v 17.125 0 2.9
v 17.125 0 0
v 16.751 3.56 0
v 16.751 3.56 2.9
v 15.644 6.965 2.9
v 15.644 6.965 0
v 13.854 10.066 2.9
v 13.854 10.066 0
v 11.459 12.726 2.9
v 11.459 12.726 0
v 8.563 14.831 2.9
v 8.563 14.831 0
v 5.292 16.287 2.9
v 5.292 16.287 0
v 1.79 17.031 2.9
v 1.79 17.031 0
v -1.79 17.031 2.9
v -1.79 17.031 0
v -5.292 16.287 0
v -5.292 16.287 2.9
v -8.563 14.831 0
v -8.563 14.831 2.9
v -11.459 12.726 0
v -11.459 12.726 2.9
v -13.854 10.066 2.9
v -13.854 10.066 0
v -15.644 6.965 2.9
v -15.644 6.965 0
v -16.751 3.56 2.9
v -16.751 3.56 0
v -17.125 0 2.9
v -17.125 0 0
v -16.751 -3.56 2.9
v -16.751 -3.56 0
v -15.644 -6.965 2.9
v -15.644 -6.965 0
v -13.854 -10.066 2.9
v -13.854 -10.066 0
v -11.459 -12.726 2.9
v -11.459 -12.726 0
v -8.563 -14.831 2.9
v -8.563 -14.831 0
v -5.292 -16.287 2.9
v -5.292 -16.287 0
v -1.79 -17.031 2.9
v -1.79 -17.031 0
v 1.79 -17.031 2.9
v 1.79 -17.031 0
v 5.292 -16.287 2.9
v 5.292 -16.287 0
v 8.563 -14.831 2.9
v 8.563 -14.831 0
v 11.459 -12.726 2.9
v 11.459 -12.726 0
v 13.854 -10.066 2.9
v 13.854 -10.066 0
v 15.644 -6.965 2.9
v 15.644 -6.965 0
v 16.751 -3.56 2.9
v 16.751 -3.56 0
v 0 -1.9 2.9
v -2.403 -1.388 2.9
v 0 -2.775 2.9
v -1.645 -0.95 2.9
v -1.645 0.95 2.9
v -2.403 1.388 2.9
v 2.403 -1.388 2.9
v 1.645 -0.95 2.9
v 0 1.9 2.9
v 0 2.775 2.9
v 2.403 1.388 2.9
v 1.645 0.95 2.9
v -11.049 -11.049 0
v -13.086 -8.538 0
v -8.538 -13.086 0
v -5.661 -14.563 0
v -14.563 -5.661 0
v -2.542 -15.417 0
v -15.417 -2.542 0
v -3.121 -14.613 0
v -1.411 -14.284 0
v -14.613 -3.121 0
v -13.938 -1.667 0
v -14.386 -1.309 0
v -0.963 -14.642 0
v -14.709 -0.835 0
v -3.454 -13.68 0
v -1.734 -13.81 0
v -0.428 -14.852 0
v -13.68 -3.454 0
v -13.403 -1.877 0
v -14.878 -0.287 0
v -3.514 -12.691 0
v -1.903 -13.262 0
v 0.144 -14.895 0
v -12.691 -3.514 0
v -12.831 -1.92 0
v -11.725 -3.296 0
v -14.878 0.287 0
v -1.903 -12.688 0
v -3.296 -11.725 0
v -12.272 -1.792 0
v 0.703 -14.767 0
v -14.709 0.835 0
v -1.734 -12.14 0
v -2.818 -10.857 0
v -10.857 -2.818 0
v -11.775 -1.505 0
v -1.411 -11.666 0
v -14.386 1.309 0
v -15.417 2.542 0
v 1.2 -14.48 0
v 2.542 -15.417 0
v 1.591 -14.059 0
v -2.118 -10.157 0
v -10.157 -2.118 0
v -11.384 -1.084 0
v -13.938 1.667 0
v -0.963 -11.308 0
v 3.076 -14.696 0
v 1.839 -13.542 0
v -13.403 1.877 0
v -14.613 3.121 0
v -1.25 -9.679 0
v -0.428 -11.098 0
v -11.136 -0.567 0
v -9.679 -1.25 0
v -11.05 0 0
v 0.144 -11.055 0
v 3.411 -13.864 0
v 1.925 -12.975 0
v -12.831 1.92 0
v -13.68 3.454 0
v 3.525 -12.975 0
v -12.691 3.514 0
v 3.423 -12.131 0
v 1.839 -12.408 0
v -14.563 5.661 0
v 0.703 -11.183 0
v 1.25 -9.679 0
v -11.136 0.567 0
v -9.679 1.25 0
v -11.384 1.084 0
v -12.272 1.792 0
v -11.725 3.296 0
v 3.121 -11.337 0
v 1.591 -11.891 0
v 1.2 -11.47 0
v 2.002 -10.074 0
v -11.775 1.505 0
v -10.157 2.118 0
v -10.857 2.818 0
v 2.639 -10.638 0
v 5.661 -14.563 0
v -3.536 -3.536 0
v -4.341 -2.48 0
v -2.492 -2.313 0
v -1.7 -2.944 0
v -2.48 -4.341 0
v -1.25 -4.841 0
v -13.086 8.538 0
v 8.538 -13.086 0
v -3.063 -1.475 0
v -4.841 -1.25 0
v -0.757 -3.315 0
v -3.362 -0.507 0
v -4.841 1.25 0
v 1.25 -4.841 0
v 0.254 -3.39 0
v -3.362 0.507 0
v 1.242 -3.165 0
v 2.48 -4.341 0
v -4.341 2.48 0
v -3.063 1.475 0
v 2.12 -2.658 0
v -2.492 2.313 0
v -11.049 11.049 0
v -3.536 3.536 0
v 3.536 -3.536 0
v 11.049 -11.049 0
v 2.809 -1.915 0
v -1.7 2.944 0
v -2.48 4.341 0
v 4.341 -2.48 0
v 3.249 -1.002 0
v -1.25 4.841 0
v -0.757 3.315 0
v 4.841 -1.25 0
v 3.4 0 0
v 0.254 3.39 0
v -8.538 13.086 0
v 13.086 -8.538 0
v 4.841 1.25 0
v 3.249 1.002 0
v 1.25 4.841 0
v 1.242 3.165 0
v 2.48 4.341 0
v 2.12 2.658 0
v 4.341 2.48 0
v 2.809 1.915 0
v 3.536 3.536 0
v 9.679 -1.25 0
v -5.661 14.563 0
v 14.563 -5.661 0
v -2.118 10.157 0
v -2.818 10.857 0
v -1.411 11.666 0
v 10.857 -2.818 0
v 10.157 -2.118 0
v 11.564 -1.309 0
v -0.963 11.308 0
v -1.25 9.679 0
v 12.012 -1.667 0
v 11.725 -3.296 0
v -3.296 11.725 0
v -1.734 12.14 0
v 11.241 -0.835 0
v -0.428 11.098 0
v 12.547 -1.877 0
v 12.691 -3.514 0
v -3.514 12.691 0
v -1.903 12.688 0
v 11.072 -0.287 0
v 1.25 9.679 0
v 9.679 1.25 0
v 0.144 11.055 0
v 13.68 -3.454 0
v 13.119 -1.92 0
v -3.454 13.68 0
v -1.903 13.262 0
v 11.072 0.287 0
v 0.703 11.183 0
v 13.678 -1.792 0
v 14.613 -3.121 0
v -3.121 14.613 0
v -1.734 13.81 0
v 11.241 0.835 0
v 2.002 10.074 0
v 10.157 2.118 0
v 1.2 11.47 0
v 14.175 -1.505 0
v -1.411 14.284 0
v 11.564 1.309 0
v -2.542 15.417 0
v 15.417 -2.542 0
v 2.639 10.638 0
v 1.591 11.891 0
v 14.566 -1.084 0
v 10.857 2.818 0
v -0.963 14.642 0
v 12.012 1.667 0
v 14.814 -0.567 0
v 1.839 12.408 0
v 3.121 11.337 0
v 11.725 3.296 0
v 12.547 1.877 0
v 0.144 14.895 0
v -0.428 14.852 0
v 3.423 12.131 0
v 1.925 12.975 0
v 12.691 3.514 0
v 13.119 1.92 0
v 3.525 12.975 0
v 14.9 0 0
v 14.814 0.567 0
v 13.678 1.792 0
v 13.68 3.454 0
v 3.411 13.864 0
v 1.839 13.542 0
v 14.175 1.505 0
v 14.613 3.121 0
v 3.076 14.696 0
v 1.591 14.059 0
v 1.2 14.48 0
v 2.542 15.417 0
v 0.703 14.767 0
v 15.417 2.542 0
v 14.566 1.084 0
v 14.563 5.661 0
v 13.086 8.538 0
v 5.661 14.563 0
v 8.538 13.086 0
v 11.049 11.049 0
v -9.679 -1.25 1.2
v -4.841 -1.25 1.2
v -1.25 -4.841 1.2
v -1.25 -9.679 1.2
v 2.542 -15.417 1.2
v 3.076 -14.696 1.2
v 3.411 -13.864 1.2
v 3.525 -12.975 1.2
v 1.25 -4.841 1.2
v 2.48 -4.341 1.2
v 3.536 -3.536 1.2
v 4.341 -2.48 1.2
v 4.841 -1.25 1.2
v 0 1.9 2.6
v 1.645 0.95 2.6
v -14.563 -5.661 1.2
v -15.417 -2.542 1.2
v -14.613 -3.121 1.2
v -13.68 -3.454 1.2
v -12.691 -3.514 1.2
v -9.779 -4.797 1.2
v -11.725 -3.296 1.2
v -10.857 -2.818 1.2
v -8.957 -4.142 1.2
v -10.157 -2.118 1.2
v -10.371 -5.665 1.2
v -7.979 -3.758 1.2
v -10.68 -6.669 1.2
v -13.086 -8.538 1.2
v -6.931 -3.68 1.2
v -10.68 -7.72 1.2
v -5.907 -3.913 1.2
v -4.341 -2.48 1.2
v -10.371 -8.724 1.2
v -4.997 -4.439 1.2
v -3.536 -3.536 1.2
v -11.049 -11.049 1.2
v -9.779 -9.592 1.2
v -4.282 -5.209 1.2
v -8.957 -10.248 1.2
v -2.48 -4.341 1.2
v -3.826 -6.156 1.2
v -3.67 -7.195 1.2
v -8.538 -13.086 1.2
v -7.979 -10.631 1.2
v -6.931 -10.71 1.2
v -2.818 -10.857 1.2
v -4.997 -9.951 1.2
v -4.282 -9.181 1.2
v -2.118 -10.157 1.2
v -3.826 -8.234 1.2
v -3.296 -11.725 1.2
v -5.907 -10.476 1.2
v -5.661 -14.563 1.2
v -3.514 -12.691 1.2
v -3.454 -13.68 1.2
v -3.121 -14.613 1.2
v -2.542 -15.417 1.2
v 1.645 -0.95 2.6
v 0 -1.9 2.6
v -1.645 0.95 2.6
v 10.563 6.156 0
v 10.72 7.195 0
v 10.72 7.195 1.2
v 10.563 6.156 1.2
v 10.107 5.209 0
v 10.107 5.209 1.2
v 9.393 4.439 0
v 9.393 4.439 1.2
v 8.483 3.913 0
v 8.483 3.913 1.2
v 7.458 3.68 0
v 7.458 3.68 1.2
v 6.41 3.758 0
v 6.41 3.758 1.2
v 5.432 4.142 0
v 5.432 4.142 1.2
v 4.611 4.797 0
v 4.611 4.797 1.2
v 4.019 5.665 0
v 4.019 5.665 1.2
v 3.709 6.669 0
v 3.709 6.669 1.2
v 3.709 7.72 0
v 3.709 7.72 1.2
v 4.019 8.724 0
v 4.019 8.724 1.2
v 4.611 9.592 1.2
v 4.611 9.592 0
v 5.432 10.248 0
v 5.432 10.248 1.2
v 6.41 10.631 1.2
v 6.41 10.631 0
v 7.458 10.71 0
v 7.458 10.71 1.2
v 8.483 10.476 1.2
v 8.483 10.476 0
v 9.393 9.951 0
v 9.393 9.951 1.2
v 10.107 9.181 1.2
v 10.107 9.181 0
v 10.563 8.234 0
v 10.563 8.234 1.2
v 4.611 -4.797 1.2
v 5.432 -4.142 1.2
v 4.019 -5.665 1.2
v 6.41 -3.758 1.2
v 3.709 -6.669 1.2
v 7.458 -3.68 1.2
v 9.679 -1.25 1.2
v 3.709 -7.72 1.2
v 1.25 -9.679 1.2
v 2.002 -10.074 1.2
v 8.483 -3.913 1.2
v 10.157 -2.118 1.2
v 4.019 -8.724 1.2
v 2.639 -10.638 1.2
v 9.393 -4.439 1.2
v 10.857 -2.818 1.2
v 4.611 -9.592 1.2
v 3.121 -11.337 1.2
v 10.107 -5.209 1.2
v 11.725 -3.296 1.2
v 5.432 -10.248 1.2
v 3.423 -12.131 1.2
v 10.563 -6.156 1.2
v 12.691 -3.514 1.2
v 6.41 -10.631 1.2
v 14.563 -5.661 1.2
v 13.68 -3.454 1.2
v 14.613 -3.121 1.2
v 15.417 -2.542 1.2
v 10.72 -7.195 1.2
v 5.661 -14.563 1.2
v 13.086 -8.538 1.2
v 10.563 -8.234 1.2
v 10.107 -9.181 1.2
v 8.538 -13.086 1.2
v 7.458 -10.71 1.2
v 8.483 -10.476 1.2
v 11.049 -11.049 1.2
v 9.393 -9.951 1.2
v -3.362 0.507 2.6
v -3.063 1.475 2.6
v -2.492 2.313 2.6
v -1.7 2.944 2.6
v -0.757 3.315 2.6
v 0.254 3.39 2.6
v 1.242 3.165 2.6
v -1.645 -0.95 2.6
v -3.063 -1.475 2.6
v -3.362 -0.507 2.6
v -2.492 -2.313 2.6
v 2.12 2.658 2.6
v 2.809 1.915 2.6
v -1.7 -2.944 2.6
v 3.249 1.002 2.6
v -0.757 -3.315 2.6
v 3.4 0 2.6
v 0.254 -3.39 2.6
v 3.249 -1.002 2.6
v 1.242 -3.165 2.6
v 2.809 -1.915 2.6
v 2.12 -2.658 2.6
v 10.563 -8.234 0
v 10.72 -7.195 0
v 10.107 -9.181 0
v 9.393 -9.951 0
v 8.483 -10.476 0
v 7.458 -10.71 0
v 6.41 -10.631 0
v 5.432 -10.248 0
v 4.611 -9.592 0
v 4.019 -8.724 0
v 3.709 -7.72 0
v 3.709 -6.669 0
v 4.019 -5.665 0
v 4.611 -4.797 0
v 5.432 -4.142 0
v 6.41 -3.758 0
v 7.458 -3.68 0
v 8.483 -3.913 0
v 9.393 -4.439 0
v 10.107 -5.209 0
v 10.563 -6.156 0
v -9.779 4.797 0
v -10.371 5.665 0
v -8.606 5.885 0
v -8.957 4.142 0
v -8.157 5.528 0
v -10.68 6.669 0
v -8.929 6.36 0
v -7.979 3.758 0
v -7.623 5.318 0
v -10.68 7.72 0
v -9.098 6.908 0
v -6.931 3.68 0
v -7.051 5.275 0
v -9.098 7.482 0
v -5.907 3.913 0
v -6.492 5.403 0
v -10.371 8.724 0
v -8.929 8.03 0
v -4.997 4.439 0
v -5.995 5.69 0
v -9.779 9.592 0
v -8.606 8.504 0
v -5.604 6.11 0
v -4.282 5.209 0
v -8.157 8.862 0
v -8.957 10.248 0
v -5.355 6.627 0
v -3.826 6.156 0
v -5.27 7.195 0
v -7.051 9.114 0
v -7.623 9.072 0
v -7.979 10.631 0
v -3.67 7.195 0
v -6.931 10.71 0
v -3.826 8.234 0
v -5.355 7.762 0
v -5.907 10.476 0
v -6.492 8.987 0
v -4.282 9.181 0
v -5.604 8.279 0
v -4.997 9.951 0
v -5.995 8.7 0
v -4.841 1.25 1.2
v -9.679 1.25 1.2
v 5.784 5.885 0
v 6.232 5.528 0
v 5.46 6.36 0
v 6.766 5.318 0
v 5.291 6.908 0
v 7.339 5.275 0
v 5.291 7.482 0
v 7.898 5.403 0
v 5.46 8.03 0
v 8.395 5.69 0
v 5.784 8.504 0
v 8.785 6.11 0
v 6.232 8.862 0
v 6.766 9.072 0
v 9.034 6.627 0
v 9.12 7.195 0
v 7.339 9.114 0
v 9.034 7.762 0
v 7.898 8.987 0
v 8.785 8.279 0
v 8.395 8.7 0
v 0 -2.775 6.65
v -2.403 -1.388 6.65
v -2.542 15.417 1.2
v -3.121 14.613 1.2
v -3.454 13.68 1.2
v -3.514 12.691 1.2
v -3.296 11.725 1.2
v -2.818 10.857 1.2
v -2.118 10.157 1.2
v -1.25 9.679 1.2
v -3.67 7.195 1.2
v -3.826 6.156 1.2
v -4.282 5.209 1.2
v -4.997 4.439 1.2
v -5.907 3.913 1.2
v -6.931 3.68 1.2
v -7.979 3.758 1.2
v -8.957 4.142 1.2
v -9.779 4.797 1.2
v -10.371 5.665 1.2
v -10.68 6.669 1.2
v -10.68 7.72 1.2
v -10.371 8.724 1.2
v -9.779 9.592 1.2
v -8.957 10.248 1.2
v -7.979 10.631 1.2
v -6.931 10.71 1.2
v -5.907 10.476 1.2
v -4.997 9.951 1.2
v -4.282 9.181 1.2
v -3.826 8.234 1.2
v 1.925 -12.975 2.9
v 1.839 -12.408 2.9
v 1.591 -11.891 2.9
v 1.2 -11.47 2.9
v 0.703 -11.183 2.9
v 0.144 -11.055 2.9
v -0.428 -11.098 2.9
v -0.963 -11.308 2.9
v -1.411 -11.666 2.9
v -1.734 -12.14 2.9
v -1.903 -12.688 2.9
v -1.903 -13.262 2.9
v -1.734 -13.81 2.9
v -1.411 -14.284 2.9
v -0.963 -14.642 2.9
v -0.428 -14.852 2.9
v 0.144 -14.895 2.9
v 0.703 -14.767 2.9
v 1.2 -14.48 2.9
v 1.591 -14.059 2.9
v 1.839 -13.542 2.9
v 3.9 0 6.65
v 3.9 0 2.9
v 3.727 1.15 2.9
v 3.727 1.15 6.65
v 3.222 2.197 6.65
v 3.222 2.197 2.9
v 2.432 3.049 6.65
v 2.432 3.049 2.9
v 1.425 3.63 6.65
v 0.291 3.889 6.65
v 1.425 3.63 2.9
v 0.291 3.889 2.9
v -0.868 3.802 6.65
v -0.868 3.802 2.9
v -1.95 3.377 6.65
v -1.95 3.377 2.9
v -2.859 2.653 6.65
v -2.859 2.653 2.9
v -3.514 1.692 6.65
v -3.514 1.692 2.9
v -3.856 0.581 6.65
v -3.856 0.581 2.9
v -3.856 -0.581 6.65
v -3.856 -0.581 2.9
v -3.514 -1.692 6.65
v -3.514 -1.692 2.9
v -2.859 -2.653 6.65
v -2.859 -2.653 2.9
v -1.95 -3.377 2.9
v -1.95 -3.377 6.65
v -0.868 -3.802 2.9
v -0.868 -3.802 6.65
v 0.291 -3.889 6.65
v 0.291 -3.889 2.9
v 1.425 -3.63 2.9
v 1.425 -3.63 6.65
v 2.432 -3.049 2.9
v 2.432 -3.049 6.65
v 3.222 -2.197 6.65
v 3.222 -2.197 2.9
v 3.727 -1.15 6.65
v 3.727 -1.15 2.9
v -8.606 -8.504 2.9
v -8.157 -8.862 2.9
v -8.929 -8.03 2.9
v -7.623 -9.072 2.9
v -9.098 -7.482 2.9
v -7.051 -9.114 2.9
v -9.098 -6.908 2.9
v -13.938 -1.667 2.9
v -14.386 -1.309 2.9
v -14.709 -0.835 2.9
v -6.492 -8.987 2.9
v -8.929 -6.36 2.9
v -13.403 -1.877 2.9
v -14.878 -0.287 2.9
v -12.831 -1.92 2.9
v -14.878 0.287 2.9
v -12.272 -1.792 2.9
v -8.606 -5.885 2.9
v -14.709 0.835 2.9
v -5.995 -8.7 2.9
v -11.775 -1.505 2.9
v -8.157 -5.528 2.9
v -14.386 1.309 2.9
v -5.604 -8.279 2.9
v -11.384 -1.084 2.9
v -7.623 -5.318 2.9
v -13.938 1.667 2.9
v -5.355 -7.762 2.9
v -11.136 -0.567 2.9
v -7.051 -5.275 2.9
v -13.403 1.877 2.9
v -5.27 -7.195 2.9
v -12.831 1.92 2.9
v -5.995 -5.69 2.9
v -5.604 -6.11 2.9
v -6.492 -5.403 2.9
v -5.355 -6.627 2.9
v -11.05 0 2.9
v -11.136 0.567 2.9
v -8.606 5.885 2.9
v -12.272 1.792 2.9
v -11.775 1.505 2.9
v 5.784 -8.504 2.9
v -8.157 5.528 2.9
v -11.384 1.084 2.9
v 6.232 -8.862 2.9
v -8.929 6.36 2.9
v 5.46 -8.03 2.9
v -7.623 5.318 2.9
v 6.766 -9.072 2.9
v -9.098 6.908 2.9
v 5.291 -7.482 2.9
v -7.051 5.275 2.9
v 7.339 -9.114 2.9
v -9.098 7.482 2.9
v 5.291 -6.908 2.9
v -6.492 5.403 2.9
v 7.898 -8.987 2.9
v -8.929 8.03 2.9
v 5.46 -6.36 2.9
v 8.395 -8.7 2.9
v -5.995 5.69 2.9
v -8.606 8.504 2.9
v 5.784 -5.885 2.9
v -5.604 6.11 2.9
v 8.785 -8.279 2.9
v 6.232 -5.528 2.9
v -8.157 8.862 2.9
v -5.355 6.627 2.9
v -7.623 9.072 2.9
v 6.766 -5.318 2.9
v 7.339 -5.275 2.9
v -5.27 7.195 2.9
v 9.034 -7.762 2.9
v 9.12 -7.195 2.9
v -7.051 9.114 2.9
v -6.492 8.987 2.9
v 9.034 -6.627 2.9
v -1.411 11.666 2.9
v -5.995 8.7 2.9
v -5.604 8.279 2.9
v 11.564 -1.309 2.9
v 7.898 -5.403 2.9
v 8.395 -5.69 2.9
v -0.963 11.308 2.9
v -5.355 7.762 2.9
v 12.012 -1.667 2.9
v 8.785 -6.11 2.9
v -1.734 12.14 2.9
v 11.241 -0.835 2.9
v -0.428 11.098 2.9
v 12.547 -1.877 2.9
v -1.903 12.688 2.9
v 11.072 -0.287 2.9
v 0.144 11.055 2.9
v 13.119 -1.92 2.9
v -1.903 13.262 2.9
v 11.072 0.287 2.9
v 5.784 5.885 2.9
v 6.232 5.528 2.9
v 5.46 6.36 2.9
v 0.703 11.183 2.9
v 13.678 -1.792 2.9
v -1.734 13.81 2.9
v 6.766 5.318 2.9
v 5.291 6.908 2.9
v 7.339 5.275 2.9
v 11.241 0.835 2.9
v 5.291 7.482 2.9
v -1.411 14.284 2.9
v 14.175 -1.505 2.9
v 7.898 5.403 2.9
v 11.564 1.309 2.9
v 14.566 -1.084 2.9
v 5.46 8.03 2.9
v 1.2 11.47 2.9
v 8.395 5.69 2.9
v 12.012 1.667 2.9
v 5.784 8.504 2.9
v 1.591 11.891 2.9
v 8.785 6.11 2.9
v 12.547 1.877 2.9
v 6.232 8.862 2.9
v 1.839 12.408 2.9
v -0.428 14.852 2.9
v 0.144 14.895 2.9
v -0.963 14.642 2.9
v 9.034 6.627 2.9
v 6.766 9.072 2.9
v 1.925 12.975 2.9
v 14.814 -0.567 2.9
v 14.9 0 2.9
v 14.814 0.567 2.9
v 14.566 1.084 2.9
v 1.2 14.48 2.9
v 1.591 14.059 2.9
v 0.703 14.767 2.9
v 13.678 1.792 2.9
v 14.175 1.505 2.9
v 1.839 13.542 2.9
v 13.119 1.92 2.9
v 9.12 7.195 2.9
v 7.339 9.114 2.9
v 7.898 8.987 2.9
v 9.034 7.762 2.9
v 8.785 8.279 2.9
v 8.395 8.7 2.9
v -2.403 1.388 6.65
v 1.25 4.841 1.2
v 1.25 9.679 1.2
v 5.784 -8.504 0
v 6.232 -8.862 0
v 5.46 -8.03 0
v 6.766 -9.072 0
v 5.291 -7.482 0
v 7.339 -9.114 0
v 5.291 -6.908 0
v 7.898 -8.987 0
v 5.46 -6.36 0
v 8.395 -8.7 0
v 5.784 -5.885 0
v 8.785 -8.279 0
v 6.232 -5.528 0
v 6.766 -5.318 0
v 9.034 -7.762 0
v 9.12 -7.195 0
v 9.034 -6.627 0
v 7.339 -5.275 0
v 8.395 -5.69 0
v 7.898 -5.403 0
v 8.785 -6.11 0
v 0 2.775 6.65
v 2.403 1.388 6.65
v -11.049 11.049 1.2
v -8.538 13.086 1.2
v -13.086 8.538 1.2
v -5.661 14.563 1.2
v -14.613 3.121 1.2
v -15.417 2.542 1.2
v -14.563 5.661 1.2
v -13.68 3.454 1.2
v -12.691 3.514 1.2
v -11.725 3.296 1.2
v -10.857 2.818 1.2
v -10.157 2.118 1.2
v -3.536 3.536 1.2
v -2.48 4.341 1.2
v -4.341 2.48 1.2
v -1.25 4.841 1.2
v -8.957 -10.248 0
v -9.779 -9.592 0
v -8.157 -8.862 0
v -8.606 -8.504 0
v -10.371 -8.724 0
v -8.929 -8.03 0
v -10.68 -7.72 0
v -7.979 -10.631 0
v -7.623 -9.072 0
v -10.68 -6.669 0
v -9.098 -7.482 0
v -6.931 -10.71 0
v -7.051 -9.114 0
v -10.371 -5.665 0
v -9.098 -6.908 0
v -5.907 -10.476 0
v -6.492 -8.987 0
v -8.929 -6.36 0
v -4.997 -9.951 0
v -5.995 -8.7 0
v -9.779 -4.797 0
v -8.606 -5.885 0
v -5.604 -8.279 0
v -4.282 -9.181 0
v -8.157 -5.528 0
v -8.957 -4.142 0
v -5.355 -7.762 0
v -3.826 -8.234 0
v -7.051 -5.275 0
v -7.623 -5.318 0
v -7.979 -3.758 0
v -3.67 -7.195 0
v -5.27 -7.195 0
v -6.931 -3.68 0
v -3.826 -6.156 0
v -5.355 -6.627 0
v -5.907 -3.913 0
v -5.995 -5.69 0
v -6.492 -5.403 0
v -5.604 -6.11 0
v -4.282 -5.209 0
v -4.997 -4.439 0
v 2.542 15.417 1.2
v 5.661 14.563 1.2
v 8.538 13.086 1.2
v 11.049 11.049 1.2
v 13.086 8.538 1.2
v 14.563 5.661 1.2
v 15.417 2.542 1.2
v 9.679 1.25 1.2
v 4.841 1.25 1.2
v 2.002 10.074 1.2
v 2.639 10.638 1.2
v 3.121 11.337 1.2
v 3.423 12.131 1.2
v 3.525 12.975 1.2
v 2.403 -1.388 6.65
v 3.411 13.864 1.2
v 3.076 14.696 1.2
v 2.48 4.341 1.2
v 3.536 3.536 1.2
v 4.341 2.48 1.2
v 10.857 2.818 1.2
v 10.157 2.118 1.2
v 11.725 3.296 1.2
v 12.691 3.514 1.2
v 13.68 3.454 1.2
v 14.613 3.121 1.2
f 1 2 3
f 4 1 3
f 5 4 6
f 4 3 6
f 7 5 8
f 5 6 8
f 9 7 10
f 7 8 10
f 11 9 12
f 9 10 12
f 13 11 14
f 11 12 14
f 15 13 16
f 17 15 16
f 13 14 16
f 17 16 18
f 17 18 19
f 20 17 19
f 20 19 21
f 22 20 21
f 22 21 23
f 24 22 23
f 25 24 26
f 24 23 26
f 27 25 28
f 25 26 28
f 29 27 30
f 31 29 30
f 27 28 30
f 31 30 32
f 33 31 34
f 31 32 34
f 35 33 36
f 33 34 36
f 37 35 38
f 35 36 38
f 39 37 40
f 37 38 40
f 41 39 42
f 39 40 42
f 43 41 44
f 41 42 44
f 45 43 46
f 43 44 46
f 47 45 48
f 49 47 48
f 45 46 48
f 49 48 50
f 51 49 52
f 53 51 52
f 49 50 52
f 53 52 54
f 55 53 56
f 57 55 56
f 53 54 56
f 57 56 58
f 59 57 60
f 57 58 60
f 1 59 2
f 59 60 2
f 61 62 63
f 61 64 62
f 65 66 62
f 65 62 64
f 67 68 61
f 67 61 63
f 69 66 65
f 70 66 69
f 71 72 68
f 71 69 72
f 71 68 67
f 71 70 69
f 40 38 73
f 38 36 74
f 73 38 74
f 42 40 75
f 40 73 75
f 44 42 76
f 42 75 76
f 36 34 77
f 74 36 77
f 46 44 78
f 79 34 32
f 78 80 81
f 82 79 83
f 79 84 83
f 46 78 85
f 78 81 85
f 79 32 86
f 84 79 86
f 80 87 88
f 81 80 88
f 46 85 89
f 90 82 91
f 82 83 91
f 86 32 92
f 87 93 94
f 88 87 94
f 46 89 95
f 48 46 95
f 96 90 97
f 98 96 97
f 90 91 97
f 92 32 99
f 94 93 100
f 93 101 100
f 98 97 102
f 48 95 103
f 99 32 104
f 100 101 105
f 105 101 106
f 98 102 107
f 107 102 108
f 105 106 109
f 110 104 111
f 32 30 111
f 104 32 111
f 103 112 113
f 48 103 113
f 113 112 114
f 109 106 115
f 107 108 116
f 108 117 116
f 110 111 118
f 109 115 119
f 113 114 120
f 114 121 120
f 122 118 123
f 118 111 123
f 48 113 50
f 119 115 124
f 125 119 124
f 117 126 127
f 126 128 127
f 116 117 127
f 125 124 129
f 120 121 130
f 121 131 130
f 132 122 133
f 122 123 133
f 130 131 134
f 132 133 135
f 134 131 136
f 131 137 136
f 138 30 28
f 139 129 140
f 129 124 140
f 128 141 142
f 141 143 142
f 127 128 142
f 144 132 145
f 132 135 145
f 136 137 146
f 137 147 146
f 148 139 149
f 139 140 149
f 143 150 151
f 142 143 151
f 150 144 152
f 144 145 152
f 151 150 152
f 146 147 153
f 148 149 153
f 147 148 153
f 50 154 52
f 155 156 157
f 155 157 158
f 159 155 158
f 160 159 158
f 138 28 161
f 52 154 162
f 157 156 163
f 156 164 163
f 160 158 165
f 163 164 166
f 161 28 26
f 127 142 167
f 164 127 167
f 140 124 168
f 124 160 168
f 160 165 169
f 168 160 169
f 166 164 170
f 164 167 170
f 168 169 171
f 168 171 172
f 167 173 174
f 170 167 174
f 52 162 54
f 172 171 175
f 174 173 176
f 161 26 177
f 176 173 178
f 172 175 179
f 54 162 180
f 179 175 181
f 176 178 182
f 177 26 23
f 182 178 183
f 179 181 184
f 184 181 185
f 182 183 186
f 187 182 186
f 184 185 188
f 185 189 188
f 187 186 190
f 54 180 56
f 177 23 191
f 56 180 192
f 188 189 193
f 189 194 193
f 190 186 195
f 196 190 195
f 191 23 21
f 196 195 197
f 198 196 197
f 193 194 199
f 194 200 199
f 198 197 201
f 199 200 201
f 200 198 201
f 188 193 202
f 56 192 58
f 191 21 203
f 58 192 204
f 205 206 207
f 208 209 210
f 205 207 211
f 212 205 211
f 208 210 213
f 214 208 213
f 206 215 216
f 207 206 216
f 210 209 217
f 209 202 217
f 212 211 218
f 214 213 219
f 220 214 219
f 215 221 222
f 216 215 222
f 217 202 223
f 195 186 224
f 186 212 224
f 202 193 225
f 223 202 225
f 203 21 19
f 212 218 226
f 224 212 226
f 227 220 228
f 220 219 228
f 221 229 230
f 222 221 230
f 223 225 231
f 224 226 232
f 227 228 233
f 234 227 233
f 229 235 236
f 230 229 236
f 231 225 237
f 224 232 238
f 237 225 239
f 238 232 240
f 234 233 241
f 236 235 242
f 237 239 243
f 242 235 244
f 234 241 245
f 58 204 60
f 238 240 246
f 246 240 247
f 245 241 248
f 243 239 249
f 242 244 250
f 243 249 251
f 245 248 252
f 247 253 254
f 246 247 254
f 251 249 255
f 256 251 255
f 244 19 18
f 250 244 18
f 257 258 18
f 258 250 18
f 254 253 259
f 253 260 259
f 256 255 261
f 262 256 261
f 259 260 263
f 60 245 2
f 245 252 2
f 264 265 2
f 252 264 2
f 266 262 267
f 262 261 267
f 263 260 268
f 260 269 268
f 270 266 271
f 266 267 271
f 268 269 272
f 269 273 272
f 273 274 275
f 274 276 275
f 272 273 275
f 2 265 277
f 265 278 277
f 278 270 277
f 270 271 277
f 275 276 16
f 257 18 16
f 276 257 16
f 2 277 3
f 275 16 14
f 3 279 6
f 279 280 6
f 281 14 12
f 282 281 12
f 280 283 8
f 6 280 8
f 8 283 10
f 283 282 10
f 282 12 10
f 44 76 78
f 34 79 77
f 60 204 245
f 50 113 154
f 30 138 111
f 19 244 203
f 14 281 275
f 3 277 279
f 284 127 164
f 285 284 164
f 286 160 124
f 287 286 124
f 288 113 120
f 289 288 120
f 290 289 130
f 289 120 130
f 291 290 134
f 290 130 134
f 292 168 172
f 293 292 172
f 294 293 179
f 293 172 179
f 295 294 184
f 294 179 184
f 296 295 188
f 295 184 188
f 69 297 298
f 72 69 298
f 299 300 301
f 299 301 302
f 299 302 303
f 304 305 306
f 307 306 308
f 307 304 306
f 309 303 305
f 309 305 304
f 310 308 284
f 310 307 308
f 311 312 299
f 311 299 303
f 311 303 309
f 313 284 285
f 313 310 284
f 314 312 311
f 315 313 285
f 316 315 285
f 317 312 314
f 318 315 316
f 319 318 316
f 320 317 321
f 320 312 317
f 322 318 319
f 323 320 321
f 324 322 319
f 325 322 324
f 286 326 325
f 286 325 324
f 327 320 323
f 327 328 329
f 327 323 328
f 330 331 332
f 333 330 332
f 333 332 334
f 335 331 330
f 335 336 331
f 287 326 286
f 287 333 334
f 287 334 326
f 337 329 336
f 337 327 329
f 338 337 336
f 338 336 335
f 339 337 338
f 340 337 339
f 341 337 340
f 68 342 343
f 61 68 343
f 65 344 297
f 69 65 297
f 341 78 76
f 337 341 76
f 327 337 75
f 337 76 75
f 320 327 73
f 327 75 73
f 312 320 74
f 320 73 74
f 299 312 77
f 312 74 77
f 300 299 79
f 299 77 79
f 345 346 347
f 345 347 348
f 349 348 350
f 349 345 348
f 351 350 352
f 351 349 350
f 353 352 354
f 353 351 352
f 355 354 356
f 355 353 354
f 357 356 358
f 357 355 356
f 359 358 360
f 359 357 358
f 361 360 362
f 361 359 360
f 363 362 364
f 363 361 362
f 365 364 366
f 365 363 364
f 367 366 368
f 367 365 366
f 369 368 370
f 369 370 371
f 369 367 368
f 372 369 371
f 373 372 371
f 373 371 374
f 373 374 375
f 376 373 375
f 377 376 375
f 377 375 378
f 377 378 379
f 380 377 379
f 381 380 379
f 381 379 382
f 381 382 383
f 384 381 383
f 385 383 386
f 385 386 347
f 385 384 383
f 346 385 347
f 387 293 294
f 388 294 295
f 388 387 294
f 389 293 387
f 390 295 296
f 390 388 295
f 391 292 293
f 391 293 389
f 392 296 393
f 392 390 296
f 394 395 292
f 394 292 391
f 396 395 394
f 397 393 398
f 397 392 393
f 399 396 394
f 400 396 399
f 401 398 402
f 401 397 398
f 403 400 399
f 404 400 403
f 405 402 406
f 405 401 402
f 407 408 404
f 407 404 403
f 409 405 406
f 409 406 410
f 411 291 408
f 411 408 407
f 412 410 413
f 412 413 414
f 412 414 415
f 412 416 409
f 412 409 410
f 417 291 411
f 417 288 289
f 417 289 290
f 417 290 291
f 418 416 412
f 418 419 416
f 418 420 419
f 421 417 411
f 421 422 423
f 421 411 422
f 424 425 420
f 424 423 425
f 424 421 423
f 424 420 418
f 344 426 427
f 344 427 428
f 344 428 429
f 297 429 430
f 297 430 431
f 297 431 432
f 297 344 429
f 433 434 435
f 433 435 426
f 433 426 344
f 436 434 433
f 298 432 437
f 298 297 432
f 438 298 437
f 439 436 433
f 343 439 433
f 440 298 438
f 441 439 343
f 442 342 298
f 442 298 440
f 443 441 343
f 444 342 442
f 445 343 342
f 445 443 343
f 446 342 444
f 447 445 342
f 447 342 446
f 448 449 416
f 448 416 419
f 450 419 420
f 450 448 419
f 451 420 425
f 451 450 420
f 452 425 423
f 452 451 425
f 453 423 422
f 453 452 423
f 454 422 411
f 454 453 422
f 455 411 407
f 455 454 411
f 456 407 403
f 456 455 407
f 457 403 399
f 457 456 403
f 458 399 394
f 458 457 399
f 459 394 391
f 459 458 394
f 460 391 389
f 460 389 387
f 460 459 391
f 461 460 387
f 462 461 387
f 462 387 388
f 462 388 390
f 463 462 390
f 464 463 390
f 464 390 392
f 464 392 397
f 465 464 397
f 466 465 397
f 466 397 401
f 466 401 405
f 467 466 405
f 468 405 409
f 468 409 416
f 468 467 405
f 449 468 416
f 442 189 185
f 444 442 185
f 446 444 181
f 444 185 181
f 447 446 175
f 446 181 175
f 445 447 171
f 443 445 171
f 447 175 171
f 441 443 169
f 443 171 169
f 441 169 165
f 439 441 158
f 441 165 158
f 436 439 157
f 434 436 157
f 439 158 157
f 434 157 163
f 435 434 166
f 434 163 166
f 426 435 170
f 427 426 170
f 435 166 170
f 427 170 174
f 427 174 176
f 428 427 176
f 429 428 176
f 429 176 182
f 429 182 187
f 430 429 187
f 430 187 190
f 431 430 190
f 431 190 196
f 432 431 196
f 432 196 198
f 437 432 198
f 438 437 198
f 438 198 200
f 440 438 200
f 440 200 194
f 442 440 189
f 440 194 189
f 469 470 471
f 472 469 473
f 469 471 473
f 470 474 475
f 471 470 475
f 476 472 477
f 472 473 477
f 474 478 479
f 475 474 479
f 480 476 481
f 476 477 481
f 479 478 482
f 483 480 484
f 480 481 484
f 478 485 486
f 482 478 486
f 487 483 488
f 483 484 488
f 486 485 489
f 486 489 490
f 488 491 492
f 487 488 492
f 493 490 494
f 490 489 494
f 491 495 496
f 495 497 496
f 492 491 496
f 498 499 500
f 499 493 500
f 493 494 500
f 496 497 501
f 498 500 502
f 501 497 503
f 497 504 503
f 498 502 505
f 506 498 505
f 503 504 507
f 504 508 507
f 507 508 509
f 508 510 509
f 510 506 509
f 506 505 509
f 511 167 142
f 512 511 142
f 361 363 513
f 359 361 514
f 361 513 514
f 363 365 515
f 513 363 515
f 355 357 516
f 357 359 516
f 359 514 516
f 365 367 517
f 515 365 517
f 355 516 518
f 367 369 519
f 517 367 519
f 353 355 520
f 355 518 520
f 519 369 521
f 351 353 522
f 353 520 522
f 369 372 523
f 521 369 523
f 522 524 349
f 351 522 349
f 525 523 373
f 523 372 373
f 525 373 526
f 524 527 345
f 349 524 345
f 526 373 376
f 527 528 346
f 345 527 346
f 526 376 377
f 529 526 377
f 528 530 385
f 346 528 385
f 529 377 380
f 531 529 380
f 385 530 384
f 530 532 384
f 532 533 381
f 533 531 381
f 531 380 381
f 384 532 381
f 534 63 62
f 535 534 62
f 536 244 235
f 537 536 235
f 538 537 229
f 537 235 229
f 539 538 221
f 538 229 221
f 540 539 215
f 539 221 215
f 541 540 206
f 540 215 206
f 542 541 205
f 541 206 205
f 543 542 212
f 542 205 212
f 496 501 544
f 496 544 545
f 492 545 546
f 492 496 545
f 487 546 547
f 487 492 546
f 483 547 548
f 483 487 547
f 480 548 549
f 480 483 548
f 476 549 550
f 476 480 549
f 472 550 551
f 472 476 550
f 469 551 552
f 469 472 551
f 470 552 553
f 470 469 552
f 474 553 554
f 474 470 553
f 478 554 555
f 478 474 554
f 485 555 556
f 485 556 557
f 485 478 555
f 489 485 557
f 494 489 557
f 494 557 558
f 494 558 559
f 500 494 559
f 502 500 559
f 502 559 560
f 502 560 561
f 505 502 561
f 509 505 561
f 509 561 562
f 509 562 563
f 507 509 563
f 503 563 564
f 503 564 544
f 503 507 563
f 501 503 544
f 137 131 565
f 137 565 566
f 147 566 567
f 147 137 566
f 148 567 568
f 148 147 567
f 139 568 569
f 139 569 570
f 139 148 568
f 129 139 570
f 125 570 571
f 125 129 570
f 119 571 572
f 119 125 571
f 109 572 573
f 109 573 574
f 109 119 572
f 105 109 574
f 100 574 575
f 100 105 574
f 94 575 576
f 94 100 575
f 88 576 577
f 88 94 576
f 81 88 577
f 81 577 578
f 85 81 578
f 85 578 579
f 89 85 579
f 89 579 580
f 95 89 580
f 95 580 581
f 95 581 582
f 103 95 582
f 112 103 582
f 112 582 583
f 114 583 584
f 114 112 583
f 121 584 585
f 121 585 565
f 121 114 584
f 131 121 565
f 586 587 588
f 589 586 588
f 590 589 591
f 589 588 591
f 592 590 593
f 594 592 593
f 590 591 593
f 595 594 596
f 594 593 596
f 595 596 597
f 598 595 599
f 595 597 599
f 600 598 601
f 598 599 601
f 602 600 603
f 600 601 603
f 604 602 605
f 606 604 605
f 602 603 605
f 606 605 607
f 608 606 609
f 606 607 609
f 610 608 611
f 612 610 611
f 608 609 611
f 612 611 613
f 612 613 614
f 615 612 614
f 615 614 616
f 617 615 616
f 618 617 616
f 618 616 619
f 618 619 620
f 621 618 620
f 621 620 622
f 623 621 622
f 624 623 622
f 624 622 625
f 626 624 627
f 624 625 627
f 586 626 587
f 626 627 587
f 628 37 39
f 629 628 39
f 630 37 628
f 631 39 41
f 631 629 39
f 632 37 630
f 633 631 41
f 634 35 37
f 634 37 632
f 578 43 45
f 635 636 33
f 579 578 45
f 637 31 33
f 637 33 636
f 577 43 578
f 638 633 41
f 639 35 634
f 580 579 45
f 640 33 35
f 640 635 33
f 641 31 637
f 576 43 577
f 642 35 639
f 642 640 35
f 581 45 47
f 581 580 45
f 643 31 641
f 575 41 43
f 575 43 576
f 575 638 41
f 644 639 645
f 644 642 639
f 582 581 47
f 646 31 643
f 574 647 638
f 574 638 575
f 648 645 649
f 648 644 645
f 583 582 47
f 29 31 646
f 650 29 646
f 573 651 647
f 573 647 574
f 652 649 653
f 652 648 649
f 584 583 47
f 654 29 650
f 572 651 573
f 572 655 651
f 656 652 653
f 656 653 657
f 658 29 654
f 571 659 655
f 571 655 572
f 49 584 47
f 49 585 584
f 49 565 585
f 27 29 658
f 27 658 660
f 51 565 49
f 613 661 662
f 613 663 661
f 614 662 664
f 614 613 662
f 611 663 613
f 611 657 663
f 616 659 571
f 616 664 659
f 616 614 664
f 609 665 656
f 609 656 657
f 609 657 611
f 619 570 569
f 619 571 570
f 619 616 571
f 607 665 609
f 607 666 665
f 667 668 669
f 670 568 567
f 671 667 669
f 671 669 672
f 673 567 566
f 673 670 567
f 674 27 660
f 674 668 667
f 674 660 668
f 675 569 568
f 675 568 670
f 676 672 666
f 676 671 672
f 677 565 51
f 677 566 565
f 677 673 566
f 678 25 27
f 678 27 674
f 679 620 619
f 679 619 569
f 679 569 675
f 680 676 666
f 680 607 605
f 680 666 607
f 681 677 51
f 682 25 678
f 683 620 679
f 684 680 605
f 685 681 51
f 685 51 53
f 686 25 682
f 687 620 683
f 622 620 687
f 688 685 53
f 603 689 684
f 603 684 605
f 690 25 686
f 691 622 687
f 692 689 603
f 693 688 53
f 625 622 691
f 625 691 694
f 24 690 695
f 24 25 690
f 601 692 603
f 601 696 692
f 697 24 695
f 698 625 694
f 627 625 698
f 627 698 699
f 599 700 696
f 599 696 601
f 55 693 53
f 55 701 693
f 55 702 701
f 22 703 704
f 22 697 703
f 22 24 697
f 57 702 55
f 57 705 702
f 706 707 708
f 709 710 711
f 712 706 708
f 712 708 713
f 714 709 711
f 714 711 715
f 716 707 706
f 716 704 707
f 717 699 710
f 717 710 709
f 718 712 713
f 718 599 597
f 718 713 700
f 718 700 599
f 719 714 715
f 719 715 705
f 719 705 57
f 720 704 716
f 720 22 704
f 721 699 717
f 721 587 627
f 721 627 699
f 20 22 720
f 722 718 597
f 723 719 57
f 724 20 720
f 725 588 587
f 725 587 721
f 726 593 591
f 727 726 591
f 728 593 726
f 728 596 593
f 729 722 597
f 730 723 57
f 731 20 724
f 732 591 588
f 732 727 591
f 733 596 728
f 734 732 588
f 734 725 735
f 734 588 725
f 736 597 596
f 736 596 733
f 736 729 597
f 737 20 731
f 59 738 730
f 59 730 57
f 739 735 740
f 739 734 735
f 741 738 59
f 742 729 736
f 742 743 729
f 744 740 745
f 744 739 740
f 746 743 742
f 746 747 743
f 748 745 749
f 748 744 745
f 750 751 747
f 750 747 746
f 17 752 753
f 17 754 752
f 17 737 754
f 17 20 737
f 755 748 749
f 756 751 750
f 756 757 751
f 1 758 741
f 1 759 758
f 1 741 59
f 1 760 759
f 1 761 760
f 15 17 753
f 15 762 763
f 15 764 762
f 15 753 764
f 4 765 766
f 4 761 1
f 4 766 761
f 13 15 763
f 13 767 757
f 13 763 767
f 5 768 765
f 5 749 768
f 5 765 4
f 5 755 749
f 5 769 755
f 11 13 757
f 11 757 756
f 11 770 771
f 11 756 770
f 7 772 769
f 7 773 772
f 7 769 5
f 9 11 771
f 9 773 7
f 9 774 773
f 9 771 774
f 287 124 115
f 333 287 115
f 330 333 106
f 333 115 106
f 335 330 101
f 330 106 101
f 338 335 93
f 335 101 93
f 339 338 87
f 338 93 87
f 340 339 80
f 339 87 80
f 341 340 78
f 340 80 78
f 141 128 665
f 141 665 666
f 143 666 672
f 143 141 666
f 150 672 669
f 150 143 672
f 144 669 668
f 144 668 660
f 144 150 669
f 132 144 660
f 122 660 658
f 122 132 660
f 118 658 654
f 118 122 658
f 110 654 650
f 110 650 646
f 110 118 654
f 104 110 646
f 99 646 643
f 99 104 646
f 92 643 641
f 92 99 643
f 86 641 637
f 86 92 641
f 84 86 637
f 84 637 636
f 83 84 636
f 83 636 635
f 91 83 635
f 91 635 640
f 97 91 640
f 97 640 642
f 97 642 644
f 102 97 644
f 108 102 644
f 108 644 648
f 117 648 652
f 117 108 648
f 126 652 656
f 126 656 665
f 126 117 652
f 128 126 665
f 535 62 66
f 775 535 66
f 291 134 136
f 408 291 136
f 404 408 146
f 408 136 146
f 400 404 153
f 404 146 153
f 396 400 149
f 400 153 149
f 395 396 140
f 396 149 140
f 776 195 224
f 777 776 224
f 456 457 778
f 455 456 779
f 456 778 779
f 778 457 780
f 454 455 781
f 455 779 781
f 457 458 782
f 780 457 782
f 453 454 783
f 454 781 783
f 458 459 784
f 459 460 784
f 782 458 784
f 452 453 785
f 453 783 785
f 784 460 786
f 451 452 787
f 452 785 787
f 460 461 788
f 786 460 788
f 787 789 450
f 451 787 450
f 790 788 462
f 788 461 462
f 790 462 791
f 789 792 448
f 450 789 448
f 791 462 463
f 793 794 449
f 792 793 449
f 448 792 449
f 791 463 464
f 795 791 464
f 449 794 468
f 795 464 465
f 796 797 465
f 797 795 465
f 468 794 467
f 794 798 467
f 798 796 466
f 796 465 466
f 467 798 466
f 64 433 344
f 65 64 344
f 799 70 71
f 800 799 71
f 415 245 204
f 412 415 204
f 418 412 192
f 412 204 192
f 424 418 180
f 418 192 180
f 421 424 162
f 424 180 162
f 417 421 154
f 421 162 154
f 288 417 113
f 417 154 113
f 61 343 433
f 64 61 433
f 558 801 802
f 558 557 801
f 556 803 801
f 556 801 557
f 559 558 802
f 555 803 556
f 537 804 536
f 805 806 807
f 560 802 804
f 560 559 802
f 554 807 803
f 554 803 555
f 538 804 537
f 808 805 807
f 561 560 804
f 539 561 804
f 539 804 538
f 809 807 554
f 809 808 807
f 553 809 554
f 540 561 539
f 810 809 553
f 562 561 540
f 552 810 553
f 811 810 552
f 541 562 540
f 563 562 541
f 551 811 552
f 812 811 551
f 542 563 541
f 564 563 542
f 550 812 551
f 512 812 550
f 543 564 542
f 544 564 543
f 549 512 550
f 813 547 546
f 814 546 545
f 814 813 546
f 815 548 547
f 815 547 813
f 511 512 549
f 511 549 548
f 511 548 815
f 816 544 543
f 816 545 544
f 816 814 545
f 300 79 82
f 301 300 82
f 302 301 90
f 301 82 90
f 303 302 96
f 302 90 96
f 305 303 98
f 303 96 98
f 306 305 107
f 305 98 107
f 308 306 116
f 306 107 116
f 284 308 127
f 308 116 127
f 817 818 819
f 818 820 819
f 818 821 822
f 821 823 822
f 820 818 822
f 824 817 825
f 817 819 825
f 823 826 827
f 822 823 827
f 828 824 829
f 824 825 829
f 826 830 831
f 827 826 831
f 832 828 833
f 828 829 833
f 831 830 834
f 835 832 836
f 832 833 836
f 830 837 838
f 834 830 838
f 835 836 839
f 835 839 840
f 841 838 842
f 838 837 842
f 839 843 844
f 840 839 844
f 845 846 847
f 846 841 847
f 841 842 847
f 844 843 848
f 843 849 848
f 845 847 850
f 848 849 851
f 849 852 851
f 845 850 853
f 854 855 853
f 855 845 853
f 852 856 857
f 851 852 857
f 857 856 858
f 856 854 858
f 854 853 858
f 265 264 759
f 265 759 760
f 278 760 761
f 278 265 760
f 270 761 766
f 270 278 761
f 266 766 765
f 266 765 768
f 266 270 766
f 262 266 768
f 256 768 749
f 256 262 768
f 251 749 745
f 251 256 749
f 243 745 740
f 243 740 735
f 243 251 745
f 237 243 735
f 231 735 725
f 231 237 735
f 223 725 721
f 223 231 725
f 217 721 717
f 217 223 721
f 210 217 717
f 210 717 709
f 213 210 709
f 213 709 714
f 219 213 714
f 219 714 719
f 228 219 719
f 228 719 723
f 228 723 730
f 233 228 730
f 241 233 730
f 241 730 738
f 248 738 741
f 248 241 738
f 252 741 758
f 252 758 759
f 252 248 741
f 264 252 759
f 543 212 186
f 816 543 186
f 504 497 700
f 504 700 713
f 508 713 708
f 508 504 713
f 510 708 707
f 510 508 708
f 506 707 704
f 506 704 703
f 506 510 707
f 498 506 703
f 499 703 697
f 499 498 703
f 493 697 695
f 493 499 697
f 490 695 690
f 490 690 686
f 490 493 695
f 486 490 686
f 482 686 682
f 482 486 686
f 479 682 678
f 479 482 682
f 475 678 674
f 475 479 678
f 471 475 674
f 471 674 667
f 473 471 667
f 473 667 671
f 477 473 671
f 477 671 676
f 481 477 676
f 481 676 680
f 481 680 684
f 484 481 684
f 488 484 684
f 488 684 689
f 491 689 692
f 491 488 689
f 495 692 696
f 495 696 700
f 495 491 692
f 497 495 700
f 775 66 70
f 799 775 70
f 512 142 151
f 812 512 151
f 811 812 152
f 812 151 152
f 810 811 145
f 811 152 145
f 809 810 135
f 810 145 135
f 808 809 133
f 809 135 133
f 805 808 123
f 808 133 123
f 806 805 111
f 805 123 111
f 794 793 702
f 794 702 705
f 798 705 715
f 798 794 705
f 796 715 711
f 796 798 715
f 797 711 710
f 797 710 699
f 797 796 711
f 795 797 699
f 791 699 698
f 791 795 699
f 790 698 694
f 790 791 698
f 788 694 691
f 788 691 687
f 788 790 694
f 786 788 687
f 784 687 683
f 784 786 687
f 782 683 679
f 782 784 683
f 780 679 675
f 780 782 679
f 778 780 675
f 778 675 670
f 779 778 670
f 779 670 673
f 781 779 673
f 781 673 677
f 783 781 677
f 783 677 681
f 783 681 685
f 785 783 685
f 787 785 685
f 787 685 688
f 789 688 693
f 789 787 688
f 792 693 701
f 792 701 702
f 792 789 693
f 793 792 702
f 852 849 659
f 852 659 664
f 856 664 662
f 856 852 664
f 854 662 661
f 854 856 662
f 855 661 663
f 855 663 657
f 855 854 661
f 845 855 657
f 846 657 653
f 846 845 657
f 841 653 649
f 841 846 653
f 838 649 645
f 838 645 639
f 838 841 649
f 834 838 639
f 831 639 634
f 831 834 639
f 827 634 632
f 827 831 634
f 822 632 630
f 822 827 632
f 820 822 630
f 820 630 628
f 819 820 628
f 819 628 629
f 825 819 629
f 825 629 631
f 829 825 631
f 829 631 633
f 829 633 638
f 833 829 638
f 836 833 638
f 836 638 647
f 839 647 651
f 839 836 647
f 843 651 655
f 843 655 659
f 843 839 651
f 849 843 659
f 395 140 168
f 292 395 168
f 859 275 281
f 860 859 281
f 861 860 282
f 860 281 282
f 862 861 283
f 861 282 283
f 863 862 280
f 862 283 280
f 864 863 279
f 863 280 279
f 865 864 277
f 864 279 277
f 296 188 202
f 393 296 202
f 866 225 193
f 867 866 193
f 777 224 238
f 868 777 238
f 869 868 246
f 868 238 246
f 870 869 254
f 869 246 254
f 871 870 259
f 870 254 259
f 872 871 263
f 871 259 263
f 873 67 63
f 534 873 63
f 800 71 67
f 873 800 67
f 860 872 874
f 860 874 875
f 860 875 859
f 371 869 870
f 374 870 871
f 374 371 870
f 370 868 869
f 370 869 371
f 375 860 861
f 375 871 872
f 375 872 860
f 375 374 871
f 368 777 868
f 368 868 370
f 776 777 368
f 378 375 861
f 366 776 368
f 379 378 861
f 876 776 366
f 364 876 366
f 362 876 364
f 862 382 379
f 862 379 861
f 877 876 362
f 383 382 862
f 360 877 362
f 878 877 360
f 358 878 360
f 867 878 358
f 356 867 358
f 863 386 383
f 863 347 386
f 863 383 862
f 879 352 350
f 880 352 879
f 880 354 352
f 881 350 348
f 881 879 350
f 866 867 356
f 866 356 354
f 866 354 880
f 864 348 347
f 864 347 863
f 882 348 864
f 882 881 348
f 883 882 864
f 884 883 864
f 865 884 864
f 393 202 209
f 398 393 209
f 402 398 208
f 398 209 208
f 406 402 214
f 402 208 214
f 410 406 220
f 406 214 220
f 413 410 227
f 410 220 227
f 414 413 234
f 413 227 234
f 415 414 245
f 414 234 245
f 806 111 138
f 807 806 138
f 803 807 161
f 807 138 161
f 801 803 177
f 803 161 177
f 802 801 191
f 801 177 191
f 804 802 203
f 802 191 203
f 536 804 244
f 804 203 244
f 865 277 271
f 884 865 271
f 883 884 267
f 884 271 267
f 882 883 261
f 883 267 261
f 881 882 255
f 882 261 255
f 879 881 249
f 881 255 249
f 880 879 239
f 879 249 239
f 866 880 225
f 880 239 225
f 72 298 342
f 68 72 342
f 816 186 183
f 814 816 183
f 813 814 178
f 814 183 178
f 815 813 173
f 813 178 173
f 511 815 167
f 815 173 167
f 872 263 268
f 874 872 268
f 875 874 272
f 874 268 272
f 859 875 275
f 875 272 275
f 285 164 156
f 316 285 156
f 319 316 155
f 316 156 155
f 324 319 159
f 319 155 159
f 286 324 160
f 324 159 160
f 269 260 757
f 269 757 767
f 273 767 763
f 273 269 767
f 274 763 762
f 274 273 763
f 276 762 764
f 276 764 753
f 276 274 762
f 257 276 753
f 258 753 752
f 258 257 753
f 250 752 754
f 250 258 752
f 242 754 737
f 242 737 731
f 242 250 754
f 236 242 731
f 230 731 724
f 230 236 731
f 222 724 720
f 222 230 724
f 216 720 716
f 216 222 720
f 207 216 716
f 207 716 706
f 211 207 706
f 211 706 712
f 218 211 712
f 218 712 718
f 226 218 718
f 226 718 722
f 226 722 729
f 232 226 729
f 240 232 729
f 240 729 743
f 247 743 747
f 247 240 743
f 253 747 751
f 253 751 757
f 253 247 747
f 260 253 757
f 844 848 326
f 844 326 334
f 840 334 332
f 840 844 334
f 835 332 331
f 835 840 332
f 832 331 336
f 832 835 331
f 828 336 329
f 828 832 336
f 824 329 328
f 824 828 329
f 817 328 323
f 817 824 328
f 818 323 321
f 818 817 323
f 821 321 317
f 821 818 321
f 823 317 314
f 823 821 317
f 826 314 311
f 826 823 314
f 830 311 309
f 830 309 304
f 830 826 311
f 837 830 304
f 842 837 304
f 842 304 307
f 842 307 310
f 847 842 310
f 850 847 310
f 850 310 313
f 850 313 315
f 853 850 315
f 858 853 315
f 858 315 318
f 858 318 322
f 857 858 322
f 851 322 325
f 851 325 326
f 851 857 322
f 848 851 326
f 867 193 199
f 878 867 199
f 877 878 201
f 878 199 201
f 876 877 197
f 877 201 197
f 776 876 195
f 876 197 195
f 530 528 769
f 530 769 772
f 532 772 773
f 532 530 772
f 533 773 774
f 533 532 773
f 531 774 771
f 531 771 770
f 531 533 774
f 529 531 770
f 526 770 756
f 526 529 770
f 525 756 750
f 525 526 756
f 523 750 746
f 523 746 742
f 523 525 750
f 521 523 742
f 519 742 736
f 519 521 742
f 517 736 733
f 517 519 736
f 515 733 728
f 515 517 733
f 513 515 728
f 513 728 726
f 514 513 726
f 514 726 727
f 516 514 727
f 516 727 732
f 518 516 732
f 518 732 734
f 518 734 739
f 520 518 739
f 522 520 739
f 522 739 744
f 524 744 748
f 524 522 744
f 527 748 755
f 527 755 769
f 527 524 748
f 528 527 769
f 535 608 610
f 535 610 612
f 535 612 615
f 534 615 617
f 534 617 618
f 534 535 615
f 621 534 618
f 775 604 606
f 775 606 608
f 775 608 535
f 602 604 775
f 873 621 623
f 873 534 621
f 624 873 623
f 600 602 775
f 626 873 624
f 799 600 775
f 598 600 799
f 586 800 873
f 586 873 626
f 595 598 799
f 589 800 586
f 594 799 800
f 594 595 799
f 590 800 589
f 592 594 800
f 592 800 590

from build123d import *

# Parameters (mm, degrees)
F0_R     = 17.125
F0_R_2   = 1.925
F1_DEPTH = 2.9
F2_R     = 3.9
F3_DEPTH = 3.75
F4_R     = 3.525
F5_DEPTH = 1.2
F4_R_2   = 3.4
F6_DEPTH = 2.6
F7_DEPTH = 25


with BuildPart() as f1:
    # F0 (on Top) → F1 (new body)
    with BuildSketch(Plane.XY):
        Circle(F0_R)
        with Locations((-7.194811, -7.194811)):
            Circle(F0_R_2, mode=Mode.SUBTRACT)
        with Locations((0, -12.975)):
            Circle(F0_R_2, mode=Mode.SUBTRACT)
        with Locations((7.194811, -7.194811)):
            Circle(F0_R_2, mode=Mode.SUBTRACT)
        with Locations((-12.975, 0)):
            Circle(F0_R_2, mode=Mode.SUBTRACT)
        with Locations((-7.194811, 7.194811)):
            Circle(F0_R_2, mode=Mode.SUBTRACT)
        with Locations((7.194811, 7.194811)):
            Circle(F0_R_2, mode=Mode.SUBTRACT)
        with Locations((12.975, 0)):
            Circle(F0_R_2, mode=Mode.SUBTRACT)
        with Locations((0, 12.975)):
            Circle(F0_R_2, mode=Mode.SUBTRACT)
    extrude(amount=F1_DEPTH)

    # F2 (on face) → F3 (join)
    with BuildSketch(Plane.XY.offset(2.9)):
        Circle(F2_R)
        Polygon((0, 2.775), (2.40322, 1.3875), (2.40322, -1.3875), (0, -2.775), (-2.40322, -1.3875), (-2.40322, 1.3875), align=None, mode=Mode.SUBTRACT)
    extrude(amount=F3_DEPTH)

    # F4 (on face) → F5 (cut)
    with BuildSketch(Plane(origin=(0, 0, 0), x_dir=(1, 0, 0), z_dir=(0, 0, -1))):
        with BuildLine():
            ThreePointArc((2.542302, -15.416787), (11.048543, -11.048543), (15.416787, -2.542302))
            ThreePointArc((15.416787, -2.542302), (12.200468, -3.438855), (9.679074, -1.25))
            Line((9.679074, -1.25), (4.841229, -1.25))
            ThreePointArc((4.841229, -1.25), (3.535534, -3.535534), (1.25, -4.841229))
            Line((1.25, -4.841229), (1.25, -9.679074))
            ThreePointArc((1.25, -9.679074), (2.901024, -10.97258), (3.525, -12.975))
            ThreePointArc((3.525, -12.975), (3.27011, -14.291057), (2.542302, -15.416787))
        make_face()
        with Locations((7.194811, -7.194811)):
            Circle(F4_R, mode=Mode.SUBTRACT)
        with BuildLine():
            ThreePointArc((9.679074, 1.25), (12.200468, 3.438855), (15.416787, 2.542302))
            ThreePointArc((15.416787, 2.542302), (11.048543, 11.048543), (2.542302, 15.416787))
            ThreePointArc((2.542302, 15.416787), (3.27011, 14.291057), (3.525, 12.975))
            ThreePointArc((3.525, 12.975), (2.901024, 10.97258), (1.25, 9.679074))
            Line((1.25, 9.679074), (1.25, 4.841229))
            ThreePointArc((1.25, 4.841229), (3.535534, 3.535534), (4.841229, 1.25))
            Line((4.841229, 1.25), (9.679074, 1.25))
        make_face()
        with Locations((7.194811, 7.194811)):
            Circle(F4_R, mode=Mode.SUBTRACT)
        with BuildLine():
            ThreePointArc((-1.25, 9.679074), (-3.438855, 12.200468), (-2.542302, 15.416787))
            ThreePointArc((-2.542302, 15.416787), (-11.048543, 11.048543), (-15.416787, 2.542302))
            ThreePointArc((-15.416787, 2.542302), (-12.200468, 3.438855), (-9.679074, 1.25))
            Line((-9.679074, 1.25), (-4.841229, 1.25))
            ThreePointArc((-4.841229, 1.25), (-3.535534, 3.535534), (-1.25, 4.841229))
            Line((-1.25, 4.841229), (-1.25, 9.679074))
        make_face()
        with Locations((-7.194811, 7.194811)):
            Circle(F4_R, mode=Mode.SUBTRACT)
        with BuildLine():
            ThreePointArc((-15.416787, -2.542302), (-11.048543, -11.048543), (-2.542302, -15.416787))
            ThreePointArc((-2.542302, -15.416787), (-3.438855, -12.200468), (-1.25, -9.679074))
            Line((-1.25, -9.679074), (-1.25, -4.841229))
            ThreePointArc((-1.25, -4.841229), (-3.535534, -3.535534), (-4.841229, -1.25))
            Line((-4.841229, -1.25), (-9.679074, -1.25))
            ThreePointArc((-9.679074, -1.25), (-12.200468, -3.438855), (-15.416787, -2.542302))
        make_face()
        with Locations((-7.194811, -7.194811)):
            Circle(F4_R, mode=Mode.SUBTRACT)
    extrude(amount=-F5_DEPTH, mode=Mode.SUBTRACT)

    # F4 (on face) → F6 (cut)
    with BuildSketch(Plane(origin=(0, 0, 0), x_dir=(1, 0, 0), z_dir=(0, 0, -1))):
        Circle(F4_R_2)
        Polygon((0, 1.9), (1.645448, 0.95), (1.645448, -0.95), (0, -1.9), (-1.645448, -0.95), (-1.645448, 0.95), align=None, mode=Mode.SUBTRACT)
    extrude(amount=-F6_DEPTH, mode=Mode.SUBTRACT)

    # F4 (on face) → F7 (cut)
    with BuildSketch(Plane(origin=(0, 0, 0), x_dir=(1, 0, 0), z_dir=(0, 0, -1))):
        Polygon((1.645448, -0.95), (1.645448, 0.95), (0, 1.9), (-1.645448, 0.95), (-1.645448, -0.95), (0, -1.9), align=None)
    extrude(amount=-F7_DEPTH, mode=Mode.SUBTRACT)


solid = f1.part
